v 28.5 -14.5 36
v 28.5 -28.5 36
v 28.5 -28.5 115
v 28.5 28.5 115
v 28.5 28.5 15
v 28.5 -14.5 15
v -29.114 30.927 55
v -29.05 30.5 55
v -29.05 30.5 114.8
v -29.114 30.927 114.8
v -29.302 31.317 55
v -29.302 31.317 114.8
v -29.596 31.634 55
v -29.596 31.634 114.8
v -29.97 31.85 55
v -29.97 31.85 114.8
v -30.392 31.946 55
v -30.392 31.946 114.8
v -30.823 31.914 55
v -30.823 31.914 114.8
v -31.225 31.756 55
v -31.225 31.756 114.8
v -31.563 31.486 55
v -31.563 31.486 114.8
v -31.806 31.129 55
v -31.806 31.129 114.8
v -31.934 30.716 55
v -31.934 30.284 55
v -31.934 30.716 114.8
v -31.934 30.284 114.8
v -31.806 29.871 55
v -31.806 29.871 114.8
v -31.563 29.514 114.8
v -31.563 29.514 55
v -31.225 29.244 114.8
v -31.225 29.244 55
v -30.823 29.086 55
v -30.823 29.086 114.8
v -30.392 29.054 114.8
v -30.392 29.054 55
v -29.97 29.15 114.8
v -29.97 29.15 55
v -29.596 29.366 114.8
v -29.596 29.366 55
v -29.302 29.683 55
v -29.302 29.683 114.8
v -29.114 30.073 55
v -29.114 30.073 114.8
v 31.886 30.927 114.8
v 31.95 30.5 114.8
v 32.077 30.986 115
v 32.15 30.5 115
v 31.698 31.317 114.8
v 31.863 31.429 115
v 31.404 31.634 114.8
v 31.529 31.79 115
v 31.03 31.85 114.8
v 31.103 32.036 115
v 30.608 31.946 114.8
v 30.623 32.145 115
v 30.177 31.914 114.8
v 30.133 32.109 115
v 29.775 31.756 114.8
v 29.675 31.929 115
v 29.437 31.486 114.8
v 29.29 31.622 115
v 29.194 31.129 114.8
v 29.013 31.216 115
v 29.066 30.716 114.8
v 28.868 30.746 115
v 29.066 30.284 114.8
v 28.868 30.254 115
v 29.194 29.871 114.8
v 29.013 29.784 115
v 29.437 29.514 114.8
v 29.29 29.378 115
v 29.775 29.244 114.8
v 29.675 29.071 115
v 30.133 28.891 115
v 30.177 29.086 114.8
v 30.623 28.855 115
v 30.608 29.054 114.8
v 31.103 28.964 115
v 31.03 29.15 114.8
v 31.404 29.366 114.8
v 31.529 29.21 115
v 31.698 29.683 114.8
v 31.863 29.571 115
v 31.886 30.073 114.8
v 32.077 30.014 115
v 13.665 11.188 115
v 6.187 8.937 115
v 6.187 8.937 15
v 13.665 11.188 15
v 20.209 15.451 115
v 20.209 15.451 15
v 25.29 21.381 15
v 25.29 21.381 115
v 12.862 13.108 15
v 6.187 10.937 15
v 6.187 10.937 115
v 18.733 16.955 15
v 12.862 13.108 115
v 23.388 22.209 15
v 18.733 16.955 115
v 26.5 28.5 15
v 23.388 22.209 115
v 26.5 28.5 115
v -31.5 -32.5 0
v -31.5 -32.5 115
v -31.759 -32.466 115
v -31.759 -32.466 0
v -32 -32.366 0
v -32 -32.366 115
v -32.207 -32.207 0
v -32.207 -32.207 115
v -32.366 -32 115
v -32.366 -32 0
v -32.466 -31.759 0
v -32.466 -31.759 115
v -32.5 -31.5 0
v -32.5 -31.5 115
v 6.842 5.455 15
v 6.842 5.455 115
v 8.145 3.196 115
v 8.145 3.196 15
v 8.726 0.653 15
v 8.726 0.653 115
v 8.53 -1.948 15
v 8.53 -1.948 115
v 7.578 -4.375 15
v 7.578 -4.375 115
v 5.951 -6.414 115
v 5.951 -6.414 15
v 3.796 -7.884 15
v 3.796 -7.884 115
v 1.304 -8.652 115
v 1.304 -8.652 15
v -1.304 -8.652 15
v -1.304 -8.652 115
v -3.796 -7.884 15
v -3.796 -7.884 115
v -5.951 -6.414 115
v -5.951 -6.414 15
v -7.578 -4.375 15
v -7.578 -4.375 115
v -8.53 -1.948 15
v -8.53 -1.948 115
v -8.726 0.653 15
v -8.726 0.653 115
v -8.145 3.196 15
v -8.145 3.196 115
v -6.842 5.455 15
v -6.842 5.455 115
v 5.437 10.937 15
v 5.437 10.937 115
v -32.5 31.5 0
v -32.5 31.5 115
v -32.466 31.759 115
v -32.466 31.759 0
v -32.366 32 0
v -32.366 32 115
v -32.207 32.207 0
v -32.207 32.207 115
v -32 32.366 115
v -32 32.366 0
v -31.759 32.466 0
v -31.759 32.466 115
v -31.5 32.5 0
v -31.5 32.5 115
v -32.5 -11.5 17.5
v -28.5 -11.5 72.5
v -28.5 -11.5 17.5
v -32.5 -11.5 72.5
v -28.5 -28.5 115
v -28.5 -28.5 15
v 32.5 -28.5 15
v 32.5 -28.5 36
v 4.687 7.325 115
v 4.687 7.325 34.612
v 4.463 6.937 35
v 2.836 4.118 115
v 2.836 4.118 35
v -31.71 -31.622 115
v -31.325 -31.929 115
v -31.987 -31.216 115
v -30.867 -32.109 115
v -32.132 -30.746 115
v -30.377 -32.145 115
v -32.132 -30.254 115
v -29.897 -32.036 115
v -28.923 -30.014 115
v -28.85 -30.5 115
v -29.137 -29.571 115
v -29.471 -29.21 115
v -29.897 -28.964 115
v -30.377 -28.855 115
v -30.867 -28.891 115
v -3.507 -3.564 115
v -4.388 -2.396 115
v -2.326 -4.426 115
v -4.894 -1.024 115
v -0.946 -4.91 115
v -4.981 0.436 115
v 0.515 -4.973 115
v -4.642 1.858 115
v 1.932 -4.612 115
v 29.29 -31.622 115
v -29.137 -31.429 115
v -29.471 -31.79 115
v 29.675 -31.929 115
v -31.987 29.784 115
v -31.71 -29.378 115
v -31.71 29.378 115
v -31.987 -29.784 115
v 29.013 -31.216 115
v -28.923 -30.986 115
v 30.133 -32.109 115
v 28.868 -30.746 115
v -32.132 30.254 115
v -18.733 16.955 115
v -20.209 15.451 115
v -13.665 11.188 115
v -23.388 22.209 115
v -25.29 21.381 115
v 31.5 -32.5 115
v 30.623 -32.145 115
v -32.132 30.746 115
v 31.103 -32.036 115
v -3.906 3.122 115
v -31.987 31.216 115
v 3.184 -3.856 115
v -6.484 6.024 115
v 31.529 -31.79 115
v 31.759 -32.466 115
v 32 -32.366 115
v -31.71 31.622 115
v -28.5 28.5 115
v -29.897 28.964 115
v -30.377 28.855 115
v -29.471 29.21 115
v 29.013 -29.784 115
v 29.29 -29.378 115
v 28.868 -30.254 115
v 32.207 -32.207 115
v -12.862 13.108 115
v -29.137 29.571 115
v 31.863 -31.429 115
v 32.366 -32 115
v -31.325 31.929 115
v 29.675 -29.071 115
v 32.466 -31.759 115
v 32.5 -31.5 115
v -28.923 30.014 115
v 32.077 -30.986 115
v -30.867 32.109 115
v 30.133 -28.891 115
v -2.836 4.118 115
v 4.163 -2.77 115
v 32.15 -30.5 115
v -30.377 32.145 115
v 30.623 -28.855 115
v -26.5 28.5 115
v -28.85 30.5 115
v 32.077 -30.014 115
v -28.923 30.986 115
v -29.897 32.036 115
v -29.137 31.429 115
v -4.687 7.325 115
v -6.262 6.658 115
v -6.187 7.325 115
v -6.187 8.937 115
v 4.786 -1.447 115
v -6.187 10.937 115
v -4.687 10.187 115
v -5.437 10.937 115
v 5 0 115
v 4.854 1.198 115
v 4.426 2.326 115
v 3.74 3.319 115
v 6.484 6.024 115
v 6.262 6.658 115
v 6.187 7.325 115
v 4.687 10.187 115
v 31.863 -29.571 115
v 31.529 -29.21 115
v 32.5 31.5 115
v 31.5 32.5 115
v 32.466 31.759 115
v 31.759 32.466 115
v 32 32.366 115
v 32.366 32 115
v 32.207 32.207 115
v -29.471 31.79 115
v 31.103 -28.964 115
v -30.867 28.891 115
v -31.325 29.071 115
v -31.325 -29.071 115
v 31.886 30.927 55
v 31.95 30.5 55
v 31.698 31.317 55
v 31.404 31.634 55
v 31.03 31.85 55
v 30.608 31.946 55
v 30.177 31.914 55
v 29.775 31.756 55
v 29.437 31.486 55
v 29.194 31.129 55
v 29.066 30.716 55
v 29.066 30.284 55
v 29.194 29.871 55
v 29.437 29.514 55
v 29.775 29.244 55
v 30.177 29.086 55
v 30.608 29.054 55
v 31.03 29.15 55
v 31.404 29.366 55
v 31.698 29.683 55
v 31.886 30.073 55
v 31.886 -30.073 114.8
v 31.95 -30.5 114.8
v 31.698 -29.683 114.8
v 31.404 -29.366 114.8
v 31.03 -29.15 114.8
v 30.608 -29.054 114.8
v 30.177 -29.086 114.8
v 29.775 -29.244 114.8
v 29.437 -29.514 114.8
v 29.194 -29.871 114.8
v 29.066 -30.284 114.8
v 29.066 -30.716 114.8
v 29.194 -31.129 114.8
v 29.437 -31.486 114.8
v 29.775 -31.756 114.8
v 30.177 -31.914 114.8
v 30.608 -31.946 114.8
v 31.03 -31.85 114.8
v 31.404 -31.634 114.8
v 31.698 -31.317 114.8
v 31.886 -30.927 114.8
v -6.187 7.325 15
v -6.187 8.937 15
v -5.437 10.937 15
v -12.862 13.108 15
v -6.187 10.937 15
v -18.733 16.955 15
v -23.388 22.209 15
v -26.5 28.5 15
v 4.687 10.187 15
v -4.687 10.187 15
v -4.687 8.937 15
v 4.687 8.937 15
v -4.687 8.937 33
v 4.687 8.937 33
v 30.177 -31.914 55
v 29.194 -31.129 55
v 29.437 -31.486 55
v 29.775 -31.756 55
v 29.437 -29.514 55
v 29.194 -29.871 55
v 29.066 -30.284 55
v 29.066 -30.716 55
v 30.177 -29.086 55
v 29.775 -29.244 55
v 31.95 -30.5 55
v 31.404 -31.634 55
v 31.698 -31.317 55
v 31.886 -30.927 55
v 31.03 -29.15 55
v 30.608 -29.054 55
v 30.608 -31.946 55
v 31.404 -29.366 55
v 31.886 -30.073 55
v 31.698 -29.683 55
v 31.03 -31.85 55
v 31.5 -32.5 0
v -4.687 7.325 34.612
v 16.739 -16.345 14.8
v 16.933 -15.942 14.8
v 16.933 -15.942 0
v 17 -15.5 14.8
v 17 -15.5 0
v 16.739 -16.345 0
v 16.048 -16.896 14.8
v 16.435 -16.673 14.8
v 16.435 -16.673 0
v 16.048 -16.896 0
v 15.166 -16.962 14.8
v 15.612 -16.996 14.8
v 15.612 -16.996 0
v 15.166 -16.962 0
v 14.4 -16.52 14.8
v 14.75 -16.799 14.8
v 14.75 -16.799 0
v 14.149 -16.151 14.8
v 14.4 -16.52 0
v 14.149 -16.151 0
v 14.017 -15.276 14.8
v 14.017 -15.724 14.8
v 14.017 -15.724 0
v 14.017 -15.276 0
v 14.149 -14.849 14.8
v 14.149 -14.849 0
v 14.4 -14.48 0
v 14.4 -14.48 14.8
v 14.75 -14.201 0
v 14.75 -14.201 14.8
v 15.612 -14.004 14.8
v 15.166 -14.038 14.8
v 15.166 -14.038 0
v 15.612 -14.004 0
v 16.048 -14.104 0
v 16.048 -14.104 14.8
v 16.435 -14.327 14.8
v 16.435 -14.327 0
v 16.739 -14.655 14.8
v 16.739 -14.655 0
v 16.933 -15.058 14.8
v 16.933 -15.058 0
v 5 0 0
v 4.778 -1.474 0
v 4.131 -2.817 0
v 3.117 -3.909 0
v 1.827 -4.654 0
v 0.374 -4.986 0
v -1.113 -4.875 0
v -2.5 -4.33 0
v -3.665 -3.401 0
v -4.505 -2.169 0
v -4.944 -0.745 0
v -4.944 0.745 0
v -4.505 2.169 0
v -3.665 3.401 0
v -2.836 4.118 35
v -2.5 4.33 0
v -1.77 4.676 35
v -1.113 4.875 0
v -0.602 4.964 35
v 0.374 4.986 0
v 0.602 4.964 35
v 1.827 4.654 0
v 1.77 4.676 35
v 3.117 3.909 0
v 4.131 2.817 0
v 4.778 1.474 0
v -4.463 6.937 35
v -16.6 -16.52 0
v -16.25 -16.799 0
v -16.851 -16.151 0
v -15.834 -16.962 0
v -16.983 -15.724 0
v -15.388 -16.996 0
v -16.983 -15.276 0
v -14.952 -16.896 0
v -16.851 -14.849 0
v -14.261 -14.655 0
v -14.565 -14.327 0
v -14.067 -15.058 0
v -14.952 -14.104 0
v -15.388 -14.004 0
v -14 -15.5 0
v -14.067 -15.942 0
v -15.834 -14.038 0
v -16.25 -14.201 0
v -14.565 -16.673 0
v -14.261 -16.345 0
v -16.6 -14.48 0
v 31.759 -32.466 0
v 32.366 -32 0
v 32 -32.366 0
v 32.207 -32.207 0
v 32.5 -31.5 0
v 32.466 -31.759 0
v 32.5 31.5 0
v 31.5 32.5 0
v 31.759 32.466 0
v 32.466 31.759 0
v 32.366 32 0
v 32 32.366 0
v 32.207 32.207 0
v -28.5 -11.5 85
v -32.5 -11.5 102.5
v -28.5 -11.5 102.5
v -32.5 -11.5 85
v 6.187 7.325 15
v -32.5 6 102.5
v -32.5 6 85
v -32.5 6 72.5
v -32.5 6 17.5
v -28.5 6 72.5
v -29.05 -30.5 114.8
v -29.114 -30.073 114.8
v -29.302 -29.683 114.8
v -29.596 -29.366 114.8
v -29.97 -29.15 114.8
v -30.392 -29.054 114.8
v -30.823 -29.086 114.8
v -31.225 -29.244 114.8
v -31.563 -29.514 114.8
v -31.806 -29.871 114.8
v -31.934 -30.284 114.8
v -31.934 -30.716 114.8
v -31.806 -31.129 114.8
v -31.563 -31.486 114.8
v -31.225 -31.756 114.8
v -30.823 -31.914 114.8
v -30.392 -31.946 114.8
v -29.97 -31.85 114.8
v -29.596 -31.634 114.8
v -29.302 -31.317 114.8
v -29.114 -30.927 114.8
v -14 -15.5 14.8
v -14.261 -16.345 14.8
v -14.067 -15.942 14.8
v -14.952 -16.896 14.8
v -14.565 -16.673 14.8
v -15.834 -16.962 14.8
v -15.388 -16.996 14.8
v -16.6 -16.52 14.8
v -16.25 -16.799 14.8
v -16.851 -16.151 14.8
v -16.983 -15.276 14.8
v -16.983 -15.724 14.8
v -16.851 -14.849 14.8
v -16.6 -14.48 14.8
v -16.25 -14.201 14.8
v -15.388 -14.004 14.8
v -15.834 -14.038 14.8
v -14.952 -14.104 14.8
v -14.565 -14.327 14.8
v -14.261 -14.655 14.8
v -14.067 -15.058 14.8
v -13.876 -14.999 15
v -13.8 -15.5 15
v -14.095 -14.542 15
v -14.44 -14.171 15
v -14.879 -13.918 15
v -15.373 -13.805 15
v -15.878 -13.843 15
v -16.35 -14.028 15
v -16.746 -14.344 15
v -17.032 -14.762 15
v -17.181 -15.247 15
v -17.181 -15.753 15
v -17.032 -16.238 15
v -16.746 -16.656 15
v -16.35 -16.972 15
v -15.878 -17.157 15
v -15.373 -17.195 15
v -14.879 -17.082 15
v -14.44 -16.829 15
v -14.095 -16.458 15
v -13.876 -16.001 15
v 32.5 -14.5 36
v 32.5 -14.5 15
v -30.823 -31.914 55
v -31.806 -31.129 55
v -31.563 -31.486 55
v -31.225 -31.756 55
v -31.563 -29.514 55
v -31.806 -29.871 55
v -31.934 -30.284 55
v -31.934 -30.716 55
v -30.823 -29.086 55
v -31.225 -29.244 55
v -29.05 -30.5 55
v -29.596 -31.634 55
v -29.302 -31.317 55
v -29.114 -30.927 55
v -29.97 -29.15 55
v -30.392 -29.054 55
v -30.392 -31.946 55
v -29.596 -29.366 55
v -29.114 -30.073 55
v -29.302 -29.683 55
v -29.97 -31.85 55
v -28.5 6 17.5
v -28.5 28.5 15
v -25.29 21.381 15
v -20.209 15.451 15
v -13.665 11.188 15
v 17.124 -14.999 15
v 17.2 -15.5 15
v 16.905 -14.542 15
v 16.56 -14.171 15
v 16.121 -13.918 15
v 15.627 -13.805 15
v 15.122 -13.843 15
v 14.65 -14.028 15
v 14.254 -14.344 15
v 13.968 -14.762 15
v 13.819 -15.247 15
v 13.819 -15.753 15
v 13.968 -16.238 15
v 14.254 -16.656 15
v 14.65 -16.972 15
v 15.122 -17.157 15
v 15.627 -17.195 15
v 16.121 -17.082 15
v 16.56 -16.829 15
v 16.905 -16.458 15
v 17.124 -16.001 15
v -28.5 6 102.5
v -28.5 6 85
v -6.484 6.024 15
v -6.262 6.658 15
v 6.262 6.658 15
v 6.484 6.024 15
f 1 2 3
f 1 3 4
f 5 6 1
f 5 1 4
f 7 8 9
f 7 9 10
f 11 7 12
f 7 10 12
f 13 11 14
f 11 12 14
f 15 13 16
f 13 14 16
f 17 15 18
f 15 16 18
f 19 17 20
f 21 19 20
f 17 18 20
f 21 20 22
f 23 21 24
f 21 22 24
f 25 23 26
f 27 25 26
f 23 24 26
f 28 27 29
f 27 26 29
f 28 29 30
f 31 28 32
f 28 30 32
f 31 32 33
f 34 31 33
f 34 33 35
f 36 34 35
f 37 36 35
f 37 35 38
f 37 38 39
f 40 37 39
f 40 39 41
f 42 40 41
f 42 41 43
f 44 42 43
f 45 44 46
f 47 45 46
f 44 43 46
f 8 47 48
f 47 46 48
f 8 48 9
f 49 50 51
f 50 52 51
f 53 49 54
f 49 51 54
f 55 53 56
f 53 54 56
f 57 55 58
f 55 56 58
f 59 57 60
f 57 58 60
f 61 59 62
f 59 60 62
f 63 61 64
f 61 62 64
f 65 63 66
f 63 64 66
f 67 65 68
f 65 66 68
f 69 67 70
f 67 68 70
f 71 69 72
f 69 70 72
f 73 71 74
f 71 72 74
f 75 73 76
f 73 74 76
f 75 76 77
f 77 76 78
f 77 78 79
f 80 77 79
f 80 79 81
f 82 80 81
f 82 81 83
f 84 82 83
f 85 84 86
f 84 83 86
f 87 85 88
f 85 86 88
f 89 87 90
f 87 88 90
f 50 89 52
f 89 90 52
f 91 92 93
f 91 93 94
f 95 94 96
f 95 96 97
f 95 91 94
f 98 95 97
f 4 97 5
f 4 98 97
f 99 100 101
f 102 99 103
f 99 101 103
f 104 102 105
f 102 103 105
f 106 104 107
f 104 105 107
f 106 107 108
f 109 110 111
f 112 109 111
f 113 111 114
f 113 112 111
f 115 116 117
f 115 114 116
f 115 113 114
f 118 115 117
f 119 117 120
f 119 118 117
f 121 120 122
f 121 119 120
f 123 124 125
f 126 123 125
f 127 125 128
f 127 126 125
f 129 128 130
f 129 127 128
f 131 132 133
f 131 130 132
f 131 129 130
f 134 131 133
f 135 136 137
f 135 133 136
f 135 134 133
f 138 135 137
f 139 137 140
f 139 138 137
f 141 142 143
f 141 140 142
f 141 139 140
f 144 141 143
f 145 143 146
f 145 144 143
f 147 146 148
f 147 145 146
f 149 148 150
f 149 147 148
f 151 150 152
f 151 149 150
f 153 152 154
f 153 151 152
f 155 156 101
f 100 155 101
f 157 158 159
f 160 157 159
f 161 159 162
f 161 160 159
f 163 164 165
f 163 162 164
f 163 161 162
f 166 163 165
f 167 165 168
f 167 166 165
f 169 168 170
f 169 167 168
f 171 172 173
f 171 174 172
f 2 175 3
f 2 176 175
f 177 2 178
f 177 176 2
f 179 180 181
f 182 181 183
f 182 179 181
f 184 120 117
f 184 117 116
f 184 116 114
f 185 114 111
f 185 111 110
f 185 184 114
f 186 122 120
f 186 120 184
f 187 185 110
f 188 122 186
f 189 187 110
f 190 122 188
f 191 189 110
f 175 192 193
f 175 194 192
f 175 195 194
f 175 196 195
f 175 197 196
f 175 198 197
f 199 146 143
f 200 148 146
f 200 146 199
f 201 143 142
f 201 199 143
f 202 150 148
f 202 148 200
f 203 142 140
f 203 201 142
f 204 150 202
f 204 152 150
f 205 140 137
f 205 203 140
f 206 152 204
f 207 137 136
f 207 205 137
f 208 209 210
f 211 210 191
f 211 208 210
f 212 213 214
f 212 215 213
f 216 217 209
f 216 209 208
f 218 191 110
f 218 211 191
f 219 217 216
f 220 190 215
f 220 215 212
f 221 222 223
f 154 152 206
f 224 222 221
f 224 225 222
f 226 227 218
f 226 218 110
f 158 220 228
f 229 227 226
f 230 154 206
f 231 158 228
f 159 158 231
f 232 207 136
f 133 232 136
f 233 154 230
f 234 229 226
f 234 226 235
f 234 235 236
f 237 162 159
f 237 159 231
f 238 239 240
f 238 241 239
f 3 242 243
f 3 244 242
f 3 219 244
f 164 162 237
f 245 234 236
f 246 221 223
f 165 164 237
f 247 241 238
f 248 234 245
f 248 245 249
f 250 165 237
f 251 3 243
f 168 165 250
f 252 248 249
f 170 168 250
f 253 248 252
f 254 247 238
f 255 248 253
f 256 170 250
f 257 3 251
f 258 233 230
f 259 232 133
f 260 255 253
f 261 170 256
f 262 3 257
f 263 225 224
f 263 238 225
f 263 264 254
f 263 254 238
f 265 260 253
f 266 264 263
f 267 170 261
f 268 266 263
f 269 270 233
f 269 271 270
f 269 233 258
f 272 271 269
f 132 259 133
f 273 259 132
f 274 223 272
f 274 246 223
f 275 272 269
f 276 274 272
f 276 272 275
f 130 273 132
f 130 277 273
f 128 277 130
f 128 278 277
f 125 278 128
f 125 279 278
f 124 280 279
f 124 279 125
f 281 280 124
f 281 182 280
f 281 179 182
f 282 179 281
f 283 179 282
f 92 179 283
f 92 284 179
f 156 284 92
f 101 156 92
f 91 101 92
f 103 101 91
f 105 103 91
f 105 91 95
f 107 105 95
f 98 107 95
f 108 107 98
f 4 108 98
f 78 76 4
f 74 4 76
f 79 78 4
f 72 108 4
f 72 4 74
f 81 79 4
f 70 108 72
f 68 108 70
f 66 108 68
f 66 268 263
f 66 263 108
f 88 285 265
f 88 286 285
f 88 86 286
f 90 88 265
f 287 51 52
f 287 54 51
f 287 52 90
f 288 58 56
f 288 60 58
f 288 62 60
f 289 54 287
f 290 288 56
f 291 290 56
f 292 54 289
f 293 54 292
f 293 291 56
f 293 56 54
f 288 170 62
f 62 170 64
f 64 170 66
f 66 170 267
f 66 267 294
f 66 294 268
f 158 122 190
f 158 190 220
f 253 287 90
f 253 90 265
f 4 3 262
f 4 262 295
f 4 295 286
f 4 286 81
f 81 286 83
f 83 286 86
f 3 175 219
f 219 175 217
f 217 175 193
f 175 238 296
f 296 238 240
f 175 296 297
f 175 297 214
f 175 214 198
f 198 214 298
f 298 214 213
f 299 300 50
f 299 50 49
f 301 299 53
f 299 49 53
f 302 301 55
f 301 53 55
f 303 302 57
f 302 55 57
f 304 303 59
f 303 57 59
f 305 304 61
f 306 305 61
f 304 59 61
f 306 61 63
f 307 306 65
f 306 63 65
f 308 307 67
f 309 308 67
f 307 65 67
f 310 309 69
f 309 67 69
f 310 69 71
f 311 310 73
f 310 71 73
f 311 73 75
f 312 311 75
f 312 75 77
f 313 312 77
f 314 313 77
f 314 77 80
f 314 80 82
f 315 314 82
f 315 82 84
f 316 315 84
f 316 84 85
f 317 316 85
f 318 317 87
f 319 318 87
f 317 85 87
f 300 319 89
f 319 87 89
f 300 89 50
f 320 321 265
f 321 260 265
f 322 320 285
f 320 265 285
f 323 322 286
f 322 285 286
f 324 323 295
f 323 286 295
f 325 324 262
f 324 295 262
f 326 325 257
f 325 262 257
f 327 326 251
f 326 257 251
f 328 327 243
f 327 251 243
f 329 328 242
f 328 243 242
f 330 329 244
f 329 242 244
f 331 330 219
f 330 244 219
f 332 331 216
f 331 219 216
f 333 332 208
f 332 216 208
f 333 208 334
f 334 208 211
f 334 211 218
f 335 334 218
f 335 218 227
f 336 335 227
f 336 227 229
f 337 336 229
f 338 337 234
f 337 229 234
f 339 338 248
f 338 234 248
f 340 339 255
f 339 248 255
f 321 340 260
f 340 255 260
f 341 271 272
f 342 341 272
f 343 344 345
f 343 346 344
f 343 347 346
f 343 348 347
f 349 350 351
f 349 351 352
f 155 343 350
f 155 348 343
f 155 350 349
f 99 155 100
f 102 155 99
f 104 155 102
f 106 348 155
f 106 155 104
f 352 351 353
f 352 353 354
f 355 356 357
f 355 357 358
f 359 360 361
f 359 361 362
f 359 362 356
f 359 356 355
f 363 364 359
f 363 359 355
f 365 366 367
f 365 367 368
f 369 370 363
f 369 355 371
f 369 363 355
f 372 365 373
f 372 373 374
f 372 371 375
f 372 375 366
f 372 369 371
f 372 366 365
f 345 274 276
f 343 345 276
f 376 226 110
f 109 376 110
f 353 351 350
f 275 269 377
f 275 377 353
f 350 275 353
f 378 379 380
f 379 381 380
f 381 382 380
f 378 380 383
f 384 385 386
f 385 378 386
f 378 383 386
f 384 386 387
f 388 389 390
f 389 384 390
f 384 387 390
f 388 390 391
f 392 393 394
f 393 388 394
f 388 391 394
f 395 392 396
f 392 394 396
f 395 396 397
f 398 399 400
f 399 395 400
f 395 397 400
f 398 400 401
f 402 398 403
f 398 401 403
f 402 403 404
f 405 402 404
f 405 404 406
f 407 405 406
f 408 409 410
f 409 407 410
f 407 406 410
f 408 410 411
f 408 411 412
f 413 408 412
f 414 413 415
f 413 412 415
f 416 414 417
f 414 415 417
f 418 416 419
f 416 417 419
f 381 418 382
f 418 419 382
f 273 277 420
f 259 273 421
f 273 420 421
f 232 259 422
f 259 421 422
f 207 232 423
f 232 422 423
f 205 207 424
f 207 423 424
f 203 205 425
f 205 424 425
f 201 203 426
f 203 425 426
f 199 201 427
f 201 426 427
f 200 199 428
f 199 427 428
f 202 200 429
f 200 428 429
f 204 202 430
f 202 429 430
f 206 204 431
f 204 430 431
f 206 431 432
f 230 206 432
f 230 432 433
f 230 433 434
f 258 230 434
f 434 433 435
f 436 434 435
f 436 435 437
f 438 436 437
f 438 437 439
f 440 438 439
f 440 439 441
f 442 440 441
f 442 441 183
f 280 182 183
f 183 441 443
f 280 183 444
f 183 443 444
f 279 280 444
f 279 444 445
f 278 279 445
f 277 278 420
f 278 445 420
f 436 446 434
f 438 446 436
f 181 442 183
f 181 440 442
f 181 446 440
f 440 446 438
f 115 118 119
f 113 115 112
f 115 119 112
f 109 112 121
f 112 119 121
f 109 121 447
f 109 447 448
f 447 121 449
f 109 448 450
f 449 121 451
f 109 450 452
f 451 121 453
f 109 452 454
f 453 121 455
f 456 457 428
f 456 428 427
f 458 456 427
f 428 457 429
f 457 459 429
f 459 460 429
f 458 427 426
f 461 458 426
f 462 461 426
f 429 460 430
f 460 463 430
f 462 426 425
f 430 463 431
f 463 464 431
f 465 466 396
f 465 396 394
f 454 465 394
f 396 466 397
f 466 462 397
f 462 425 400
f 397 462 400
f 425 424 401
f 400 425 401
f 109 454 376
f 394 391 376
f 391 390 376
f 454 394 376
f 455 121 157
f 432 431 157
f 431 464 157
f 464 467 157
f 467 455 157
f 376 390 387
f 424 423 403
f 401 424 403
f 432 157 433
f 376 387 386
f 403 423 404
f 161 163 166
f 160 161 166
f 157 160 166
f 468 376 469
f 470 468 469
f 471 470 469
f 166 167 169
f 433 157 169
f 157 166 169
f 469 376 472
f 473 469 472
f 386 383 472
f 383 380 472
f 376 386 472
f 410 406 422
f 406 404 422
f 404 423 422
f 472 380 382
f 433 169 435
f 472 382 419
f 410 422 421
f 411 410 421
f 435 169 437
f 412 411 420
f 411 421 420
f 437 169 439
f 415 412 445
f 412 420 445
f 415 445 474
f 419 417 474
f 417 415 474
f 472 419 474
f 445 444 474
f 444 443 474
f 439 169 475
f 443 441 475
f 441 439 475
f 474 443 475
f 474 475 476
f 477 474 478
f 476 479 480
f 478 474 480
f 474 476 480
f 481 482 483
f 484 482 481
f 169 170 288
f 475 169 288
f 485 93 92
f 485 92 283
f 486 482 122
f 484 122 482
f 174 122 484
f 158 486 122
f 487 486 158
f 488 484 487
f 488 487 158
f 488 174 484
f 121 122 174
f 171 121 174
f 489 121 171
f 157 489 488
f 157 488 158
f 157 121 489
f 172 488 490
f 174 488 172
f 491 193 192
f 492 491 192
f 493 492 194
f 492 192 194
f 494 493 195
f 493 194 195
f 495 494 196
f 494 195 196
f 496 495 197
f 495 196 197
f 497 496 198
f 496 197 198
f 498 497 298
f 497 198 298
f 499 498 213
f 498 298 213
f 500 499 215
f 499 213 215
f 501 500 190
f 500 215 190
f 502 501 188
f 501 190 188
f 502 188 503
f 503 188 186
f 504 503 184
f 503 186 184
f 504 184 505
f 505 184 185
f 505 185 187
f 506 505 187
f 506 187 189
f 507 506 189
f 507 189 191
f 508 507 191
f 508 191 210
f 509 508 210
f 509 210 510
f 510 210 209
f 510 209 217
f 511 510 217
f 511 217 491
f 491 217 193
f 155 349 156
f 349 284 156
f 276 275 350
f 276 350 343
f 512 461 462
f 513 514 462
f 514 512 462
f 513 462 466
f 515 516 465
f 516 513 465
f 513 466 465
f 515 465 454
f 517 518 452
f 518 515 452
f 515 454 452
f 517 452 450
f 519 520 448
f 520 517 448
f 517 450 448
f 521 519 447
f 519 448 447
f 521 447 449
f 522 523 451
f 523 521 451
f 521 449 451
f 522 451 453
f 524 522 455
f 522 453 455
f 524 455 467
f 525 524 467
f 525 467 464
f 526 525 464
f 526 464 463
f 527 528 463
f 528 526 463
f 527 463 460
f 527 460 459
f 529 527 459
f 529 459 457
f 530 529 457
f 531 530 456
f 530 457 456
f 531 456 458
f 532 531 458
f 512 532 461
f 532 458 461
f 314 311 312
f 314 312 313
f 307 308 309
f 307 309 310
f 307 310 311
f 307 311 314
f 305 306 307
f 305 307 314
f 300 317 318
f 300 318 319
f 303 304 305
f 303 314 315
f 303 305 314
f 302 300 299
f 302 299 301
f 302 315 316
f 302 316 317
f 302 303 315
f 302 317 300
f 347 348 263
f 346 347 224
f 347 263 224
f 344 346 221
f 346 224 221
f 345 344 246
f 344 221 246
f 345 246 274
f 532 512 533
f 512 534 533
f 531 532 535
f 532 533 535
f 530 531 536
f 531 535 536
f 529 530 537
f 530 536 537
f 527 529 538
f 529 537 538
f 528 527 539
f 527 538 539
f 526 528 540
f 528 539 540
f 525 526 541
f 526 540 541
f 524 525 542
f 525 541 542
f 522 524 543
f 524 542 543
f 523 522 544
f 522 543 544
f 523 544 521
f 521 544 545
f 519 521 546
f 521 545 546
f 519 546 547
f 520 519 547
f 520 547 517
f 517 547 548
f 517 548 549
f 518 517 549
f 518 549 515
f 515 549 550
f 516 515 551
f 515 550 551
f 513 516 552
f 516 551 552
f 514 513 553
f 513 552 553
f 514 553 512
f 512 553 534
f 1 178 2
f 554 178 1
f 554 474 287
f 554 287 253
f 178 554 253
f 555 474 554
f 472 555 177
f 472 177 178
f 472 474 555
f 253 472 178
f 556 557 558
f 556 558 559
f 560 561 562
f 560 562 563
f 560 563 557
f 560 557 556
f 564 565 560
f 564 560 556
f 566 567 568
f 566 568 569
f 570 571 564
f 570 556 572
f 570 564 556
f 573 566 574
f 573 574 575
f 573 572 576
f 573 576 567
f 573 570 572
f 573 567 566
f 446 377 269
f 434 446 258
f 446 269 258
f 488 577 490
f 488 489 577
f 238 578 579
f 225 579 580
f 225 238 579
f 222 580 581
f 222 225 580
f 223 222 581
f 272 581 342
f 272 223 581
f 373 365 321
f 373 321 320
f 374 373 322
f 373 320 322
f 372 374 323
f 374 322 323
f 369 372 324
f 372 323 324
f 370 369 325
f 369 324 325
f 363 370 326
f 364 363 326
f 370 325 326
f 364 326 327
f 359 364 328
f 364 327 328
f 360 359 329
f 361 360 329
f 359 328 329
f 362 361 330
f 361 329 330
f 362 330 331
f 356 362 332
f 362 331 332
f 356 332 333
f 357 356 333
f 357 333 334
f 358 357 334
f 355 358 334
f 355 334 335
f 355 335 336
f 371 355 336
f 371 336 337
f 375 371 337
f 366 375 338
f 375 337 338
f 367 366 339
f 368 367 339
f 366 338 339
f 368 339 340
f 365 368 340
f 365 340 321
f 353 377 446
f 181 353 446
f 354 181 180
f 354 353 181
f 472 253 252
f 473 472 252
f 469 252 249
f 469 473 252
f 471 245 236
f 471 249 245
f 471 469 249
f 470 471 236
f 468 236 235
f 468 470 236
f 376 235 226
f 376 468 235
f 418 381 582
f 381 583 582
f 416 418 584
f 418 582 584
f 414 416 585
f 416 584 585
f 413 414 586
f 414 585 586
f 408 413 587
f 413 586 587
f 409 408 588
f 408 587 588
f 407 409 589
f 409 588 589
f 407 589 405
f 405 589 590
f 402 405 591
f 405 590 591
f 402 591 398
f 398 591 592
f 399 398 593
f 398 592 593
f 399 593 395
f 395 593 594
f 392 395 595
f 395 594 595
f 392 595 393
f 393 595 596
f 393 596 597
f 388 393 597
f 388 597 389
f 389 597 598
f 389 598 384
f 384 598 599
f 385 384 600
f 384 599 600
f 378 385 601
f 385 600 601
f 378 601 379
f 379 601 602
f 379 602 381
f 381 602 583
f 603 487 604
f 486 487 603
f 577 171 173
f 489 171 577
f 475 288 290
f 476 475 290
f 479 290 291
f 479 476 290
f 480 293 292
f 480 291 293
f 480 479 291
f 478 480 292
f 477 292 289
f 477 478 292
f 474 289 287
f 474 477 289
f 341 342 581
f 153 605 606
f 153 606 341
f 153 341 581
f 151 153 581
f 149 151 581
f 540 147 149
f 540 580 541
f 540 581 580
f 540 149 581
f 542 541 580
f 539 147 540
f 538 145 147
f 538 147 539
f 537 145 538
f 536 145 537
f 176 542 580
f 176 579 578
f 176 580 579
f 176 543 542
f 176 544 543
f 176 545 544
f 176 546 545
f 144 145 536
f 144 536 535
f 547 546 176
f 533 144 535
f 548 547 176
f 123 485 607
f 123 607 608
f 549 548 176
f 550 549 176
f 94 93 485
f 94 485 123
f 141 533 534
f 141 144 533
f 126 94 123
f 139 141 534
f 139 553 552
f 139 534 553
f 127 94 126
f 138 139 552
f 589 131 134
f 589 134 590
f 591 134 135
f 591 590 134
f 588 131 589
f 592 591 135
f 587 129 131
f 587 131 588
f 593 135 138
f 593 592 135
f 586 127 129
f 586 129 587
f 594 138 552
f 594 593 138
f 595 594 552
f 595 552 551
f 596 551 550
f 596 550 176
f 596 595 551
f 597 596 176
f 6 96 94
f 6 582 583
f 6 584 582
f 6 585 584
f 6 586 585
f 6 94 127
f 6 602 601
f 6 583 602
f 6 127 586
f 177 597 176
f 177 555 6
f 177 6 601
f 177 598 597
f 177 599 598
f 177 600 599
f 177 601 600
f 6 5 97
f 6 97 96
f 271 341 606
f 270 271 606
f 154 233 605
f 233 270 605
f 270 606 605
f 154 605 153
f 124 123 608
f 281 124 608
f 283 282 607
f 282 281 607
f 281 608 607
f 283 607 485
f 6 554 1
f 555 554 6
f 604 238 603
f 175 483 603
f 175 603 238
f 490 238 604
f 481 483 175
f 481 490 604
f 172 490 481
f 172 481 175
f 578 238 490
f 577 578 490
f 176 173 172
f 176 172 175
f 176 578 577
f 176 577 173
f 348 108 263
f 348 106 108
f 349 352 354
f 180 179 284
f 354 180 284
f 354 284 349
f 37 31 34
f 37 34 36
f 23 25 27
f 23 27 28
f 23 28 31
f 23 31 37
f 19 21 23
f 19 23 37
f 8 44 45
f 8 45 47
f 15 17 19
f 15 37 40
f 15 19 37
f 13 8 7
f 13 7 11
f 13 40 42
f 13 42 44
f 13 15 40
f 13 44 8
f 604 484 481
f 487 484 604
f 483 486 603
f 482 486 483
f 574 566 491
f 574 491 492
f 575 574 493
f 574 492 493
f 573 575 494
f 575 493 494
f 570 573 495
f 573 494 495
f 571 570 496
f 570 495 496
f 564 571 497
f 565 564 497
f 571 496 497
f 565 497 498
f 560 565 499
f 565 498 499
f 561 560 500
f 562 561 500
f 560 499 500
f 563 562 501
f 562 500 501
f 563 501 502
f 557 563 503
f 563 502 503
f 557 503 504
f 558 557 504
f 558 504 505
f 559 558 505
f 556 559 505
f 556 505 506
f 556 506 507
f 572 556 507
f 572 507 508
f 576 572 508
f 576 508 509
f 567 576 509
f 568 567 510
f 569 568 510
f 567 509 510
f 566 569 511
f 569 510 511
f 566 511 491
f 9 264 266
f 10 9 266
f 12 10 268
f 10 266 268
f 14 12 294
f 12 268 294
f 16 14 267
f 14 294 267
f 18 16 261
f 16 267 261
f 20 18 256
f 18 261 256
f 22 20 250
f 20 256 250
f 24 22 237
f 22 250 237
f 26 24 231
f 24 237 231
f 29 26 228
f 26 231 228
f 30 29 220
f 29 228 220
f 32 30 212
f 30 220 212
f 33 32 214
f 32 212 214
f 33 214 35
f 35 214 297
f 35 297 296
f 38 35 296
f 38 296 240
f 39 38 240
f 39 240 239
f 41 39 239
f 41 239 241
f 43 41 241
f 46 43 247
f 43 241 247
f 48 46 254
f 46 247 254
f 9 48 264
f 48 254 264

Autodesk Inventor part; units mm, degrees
ref_plane "YZ Plane" through (0, 0, 0) normal (1, 0, 0) x (0, 1, 0)
ref_plane "XZ Plane" through (0, 0, 0) normal (0, 1, 0) x (-1, 0, 0)
ref_plane "XY Plane" through (0, 0, 0) normal (0, 0, 1) x (1, 0, 0)
sketch "Sketch1" plane through (0, 0, 0) normal (0, 0, 1) x (1, 0, 0)
  circle A0 centre (0, 0) radius 5
  line L0 (15.5, -15.5) -> (-15.5, -15.5) construction
  line L1 (-15.5, -15.5) -> (-15.5, 15.5) construction
  line L2 (-15.5, 15.5) -> (15.5, 15.5) construction
  line L3 (15.5, 15.5) -> (15.5, -15.5) construction
  line L4 (15.5, -15.5) -> (-15.5, 15.5) construction
  line L5 (-15.5, -15.5) -> (15.5, 15.5) construction
  circle A1 centre (-15.5, 15.5) radius 1.5
  circle A2 centre (15.5, 15.5) radius 1.5
  circle A3 centre (15.5, -15.5) radius 1.5
  circle A4 centre (-15.5, -15.5) radius 1.5
  line L6 (31.5, -32.5) -> (-31.5, -32.5)
  line L7 (-32.5, -31.5) -> (-32.5, 31.5)
  line L8 (-31.5, 32.5) -> (31.5, 32.5)
  line L9 (32.5, 31.5) -> (32.5, -31.5)
  line L10 (32.5, -32.5) -> (-32.5, 32.5) construction
  line L11 (-32.5, -32.5) -> (32.5, 32.5) construction
  arc A5 (-31.5, 32.5) -> (-32.5, 31.5) centre (-31.5, 31.5) ccw
  arc A6 (-32.5, -31.5) -> (-31.5, -32.5) centre (-31.5, -31.5) ccw
  arc A7 (31.5, -32.5) -> (32.5, -31.5) centre (31.5, -31.5) ccw
  arc A8 (32.5, 31.5) -> (31.5, 32.5) centre (31.5, 31.5) ccw
  arc A9 (-6.8415, 5.4549) -> (6.8415, 5.4549) centre (0, 0) ccw
  line L12 (-6.1872, 7.3252) -> (-6.1872, 8.9372)
  line L13 (-6.1872, 8.9372) -> (6.1872, 8.9372)
  line L14 (6.1872, 8.9372) -> (6.1872, 7.3252)
  arc A10 (-6.8415, 5.4549) -> (-6.1872, 7.3252) centre (-9.1872, 7.3252) ccw
  arc A11 (6.1872, 7.3252) -> (6.8415, 5.4549) centre (9.1872, 7.3252) ccw
  line L15 (28.5, 28.5) -> (-28.5, 28.5)
  line L16 (-28.5, 28.5) -> (-28.5, -28.5)
  line L17 (-28.5, -28.5) -> (28.5, -28.5)
  line L18 (28.5, -28.5) -> (28.5, 28.5)
  point P0 (-6.1872, 6.1872)
  point P1 (6.1872, 6.1872)
  dimension "d0" = 10
  dimension "d1" = 31
  dimension "d2" = 31
  dimension "d3" = 3
  dimension "d4" = 3
  dimension "d5" = 3
  dimension "d6" = 3
  dimension "d7" = 65
  dimension "d8" = 65
  dimension "d9" = 1
  dimension "d10" = 17.5
  dimension "d11" = 2.75
  dimension "d12" = 3
  dimension "d13" = 4
extrude "Extrusion1" add sketch "Sketch1" along normal blind 115 contours L6 A6 L7 A5 L8 A8 L9 A7 | A10 L12 L13 L14 A11 A9
extrude "Extrusion2" add sketch "Sketch1" along normal blind 15 contours L18 L17 L16 L15
sketch "Sketch2" plane through (-31.5, 32.5, 0) normal (0, 1, 0) x (1, 0, 0)
  point P0 (31.5, 0)
sketch "Sketch3" plane through (0, 0, 115) normal (0, 0, 1) x (1, 0, 0)
  arc A0 (-28.5, 28.5) -> (-6.1872, 8.9372) centre (-2.0793, 36.1286) ccw
  line L0 (6.1872, 7.3252) -> (6.1872, 8.9372) projected
  line L1 (28.5, 28.5) -> (28.5, -28.5) projected
  arc A1 (6.1872, 8.9372) -> (28.5, 28.5) centre (2.0793, 36.1286) ccw
  line L2 (6.1872, 8.9372) -> (-6.1872, 8.9372) projected
  line L3 (-28.5, 28.5) -> (28.5, 28.5) projected
  line L4 (-28.5, 28.5) -> (-26.5, 28.5)
  line L5 (28.5, 28.5) -> (26.5, 28.5)
  arc A2 (-26.5, 28.5) -> (-6.1872, 10.9372) centre (-1.4006, 37.0013) ccw
  arc A3 (6.1872, 10.9372) -> (26.5, 28.5) centre (1.4006, 37.0013) ccw
  line L6 (-6.1872, 8.9372) -> (-6.1872, 7.3252) projected
  line L7 (-6.1872, 8.9372) -> (-6.1872, 7.3252)
  line L8 (-6.1872, 7.3252) -> (-4.6872, 7.3252)
  line L9 (-4.6872, 7.3252) -> (-4.6872, 10.1872)
  line L10 (6.1872, 8.9372) -> (6.1872, 7.3252)
  line L11 (6.1872, 7.3252) -> (4.6872, 7.3252)
  line L12 (4.6872, 7.3252) -> (4.6872, 10.1872)
  line L13 (-6.1872, 10.9372) -> (-5.4372, 10.9372)
  line L14 (5.4372, 10.9372) -> (6.1872, 10.9372)
  line L15 (-4.6872, 10.1872) -> (-5.4372, 10.9372)
  line L16 (4.6872, 10.1872) -> (5.4372, 10.9372)
  line L17 (-5.4372, 10.9372) -> (5.4372, 10.9372)
  line L18 (4.6872, 7.3252) -> (-4.6872, 7.3252)
  line L19 (-4.6872, 7.3252) -> (-2.8356, 4.1182)
  line L20 (-4.6872, 7.3252) -> (-0.7761, 7.3252) construction
  line L21 (4.6872, 7.1776) -> (8.8154, 7.1776) construction
  circle A4 centre (0, 0) radius 5
  line L22 (4.6872, 7.3252) -> (2.8356, 4.1182)
  line L23 (4.6872, 7.3252) -> (9.2305, 7.3252) construction
  circle A5 centre (0, 0) radius 8.75
  point P0 (-4.6872, 10.9372)
  point P1 (4.6872, 10.9372)
  point P2 (-4.7858, 7.3252)
  point P3 (-4.6872, 7.3887)
  point P4 (4.6872, 7.3887)
  point P5 (4.7858, 7.3252)
  dimension "d18" = 27.5
  dimension "d19" = 27.5
  dimension "d20" = 2
  dimension "d21" = 2
  dimension "d23" = 26.5
  dimension "d24" = 26.5
  dimension "d25" = 22.3128
  dimension "d26" = 29.9006
  dimension "d27" = 1.5
  dimension "d28" = 1.5
  dimension "d29" = 2
  dimension "d30" = 2
  dimension "d31" = 0.75
  dimension "d32" = 0.75
  dimension "d33" = 0.75
  dimension "d34" = 0.75
  dimension "d35" = 60
  dimension "d37" = 120
  dimension "d38" = 10
  dimension "d39" = 17.5
extrude "Extrusion3" add sketch "Sketch3" against normal blind 105 contours L3 A2 L13 L15 L9 L2 A0 | L2 L9 A5 L8 L6 | L3 A1 L2 L12 L16 L14 A3 | L2 L0 L11 A5 L12
extrude "Extrusion4" cut sketch "Sketch3" against normal blind 80 contours L9 L15 L17 L16 L12 L2 | L2 L12 A5 L9 | A5 L12 L18 L9 | L18 L22 A4 L19
extrude "Extrusion5" add sketch "Sketch1" along normal blind 15 contours A1 | A2
chamfer "Chamfer1" distance 2 angle 45 1 edges at (0, 8.9372, 35)
sketch "Sketch4" plane through (0, 0, 115) normal (0, 0, 1) x (1, 0, 0)
  line L0 (30.5, -30.5) -> (-30.5, -30.5) construction
  line L1 (-30.5, -30.5) -> (-30.5, 30.5) construction
  line L2 (-30.5, 30.5) -> (30.5, 30.5) construction
  line L3 (30.5, 30.5) -> (30.5, -30.5) construction
  line L4 (30.5, -30.5) -> (-30.5, 30.5) construction
  line L5 (-30.5, -30.5) -> (30.5, 30.5) construction
  circle A0 centre (-30.5, 30.5) radius 1.45
  circle A1 centre (30.5, 30.5) radius 1.45
  circle A2 centre (30.5, -30.5) radius 1.45
  circle A3 centre (-30.5, -30.5) radius 1.45
  point P0 (0, 0)
  dimension "d52" = 61
  dimension "d53" = 61
  dimension "d54" = 2.9
  dimension "d55" = 2.9
  dimension "d56" = 2.9
  dimension "d57" = 2.9
extrude "Extrusion6" cut sketch "Sketch4" against normal blind 60
chamfer "Chamfer2" distance 0.2 angle 45 6 edges at (-31.95, 30.5, 115) (29.05, 30.5, 115) (-31.95, -30.5, 115) (-17, -15.5, 15) (14, -15.5, 15) (29.05, -30.5, 115)
sketch "Sketch5" plane through (-32.5, -31.5, 0) normal (-1, 0, 0) x (0, 0, 1)
  line L0 (17.5, 37.5) -> (72.5, 37.5)
  line L1 (72.5, 37.5) -> (72.5, 20)
  line L2 (72.5, 20) -> (17.5, 20)
  line L3 (17.5, 20) -> (17.5, 37.5)
  line L4 (85, 37.5) -> (102.5, 37.5)
  line L5 (102.5, 37.5) -> (102.5, 20)
  line L6 (102.5, 20) -> (85, 20)
  line L7 (85, 20) -> (85, 37.5)
  line L8 (0, 63) -> (0, 0) projected
  line L9 (115, 63) -> (115, 0) projected
  point P0 (0, 31.5)
  dimension "d63" = 12.5
  dimension "d64" = 17.5
  dimension "d65" = 17.5
  dimension "d66" = 55
  dimension "d67" = 12.5
  dimension "d68" = 20
extrude "Extrusion7" cut sketch "Sketch5" against normal up to surface (4 mm away)
sketch "Sketch6" plane through (32.5, -31.5, 0) normal (1, 0, 0) x (0, 0, -1)
  line L0 (-15, 60) -> (-15, 3) projected
  line L1 (-15, 3) -> (-36, 3)
  line L2 (-36, 3) -> (-36, 17)
  line L3 (-36, 17) -> (-15, 17)
  line L4 (-15, 17) -> (-15, 3)
  point P0 (0, 31.5)
  dimension "d71" = 21
  dimension "d72" = 14
extrude "Extrusion8" cut sketch "Sketch6" against normal up to surface (4 mm away)
equation "\"d5\" = d4"
equation "\"d6\" = d5"
equation "\"d32\" = d31"
equation "\"d33\" = d31"
equation "\"d34\" = d33"
properties part number "doser-housing"
